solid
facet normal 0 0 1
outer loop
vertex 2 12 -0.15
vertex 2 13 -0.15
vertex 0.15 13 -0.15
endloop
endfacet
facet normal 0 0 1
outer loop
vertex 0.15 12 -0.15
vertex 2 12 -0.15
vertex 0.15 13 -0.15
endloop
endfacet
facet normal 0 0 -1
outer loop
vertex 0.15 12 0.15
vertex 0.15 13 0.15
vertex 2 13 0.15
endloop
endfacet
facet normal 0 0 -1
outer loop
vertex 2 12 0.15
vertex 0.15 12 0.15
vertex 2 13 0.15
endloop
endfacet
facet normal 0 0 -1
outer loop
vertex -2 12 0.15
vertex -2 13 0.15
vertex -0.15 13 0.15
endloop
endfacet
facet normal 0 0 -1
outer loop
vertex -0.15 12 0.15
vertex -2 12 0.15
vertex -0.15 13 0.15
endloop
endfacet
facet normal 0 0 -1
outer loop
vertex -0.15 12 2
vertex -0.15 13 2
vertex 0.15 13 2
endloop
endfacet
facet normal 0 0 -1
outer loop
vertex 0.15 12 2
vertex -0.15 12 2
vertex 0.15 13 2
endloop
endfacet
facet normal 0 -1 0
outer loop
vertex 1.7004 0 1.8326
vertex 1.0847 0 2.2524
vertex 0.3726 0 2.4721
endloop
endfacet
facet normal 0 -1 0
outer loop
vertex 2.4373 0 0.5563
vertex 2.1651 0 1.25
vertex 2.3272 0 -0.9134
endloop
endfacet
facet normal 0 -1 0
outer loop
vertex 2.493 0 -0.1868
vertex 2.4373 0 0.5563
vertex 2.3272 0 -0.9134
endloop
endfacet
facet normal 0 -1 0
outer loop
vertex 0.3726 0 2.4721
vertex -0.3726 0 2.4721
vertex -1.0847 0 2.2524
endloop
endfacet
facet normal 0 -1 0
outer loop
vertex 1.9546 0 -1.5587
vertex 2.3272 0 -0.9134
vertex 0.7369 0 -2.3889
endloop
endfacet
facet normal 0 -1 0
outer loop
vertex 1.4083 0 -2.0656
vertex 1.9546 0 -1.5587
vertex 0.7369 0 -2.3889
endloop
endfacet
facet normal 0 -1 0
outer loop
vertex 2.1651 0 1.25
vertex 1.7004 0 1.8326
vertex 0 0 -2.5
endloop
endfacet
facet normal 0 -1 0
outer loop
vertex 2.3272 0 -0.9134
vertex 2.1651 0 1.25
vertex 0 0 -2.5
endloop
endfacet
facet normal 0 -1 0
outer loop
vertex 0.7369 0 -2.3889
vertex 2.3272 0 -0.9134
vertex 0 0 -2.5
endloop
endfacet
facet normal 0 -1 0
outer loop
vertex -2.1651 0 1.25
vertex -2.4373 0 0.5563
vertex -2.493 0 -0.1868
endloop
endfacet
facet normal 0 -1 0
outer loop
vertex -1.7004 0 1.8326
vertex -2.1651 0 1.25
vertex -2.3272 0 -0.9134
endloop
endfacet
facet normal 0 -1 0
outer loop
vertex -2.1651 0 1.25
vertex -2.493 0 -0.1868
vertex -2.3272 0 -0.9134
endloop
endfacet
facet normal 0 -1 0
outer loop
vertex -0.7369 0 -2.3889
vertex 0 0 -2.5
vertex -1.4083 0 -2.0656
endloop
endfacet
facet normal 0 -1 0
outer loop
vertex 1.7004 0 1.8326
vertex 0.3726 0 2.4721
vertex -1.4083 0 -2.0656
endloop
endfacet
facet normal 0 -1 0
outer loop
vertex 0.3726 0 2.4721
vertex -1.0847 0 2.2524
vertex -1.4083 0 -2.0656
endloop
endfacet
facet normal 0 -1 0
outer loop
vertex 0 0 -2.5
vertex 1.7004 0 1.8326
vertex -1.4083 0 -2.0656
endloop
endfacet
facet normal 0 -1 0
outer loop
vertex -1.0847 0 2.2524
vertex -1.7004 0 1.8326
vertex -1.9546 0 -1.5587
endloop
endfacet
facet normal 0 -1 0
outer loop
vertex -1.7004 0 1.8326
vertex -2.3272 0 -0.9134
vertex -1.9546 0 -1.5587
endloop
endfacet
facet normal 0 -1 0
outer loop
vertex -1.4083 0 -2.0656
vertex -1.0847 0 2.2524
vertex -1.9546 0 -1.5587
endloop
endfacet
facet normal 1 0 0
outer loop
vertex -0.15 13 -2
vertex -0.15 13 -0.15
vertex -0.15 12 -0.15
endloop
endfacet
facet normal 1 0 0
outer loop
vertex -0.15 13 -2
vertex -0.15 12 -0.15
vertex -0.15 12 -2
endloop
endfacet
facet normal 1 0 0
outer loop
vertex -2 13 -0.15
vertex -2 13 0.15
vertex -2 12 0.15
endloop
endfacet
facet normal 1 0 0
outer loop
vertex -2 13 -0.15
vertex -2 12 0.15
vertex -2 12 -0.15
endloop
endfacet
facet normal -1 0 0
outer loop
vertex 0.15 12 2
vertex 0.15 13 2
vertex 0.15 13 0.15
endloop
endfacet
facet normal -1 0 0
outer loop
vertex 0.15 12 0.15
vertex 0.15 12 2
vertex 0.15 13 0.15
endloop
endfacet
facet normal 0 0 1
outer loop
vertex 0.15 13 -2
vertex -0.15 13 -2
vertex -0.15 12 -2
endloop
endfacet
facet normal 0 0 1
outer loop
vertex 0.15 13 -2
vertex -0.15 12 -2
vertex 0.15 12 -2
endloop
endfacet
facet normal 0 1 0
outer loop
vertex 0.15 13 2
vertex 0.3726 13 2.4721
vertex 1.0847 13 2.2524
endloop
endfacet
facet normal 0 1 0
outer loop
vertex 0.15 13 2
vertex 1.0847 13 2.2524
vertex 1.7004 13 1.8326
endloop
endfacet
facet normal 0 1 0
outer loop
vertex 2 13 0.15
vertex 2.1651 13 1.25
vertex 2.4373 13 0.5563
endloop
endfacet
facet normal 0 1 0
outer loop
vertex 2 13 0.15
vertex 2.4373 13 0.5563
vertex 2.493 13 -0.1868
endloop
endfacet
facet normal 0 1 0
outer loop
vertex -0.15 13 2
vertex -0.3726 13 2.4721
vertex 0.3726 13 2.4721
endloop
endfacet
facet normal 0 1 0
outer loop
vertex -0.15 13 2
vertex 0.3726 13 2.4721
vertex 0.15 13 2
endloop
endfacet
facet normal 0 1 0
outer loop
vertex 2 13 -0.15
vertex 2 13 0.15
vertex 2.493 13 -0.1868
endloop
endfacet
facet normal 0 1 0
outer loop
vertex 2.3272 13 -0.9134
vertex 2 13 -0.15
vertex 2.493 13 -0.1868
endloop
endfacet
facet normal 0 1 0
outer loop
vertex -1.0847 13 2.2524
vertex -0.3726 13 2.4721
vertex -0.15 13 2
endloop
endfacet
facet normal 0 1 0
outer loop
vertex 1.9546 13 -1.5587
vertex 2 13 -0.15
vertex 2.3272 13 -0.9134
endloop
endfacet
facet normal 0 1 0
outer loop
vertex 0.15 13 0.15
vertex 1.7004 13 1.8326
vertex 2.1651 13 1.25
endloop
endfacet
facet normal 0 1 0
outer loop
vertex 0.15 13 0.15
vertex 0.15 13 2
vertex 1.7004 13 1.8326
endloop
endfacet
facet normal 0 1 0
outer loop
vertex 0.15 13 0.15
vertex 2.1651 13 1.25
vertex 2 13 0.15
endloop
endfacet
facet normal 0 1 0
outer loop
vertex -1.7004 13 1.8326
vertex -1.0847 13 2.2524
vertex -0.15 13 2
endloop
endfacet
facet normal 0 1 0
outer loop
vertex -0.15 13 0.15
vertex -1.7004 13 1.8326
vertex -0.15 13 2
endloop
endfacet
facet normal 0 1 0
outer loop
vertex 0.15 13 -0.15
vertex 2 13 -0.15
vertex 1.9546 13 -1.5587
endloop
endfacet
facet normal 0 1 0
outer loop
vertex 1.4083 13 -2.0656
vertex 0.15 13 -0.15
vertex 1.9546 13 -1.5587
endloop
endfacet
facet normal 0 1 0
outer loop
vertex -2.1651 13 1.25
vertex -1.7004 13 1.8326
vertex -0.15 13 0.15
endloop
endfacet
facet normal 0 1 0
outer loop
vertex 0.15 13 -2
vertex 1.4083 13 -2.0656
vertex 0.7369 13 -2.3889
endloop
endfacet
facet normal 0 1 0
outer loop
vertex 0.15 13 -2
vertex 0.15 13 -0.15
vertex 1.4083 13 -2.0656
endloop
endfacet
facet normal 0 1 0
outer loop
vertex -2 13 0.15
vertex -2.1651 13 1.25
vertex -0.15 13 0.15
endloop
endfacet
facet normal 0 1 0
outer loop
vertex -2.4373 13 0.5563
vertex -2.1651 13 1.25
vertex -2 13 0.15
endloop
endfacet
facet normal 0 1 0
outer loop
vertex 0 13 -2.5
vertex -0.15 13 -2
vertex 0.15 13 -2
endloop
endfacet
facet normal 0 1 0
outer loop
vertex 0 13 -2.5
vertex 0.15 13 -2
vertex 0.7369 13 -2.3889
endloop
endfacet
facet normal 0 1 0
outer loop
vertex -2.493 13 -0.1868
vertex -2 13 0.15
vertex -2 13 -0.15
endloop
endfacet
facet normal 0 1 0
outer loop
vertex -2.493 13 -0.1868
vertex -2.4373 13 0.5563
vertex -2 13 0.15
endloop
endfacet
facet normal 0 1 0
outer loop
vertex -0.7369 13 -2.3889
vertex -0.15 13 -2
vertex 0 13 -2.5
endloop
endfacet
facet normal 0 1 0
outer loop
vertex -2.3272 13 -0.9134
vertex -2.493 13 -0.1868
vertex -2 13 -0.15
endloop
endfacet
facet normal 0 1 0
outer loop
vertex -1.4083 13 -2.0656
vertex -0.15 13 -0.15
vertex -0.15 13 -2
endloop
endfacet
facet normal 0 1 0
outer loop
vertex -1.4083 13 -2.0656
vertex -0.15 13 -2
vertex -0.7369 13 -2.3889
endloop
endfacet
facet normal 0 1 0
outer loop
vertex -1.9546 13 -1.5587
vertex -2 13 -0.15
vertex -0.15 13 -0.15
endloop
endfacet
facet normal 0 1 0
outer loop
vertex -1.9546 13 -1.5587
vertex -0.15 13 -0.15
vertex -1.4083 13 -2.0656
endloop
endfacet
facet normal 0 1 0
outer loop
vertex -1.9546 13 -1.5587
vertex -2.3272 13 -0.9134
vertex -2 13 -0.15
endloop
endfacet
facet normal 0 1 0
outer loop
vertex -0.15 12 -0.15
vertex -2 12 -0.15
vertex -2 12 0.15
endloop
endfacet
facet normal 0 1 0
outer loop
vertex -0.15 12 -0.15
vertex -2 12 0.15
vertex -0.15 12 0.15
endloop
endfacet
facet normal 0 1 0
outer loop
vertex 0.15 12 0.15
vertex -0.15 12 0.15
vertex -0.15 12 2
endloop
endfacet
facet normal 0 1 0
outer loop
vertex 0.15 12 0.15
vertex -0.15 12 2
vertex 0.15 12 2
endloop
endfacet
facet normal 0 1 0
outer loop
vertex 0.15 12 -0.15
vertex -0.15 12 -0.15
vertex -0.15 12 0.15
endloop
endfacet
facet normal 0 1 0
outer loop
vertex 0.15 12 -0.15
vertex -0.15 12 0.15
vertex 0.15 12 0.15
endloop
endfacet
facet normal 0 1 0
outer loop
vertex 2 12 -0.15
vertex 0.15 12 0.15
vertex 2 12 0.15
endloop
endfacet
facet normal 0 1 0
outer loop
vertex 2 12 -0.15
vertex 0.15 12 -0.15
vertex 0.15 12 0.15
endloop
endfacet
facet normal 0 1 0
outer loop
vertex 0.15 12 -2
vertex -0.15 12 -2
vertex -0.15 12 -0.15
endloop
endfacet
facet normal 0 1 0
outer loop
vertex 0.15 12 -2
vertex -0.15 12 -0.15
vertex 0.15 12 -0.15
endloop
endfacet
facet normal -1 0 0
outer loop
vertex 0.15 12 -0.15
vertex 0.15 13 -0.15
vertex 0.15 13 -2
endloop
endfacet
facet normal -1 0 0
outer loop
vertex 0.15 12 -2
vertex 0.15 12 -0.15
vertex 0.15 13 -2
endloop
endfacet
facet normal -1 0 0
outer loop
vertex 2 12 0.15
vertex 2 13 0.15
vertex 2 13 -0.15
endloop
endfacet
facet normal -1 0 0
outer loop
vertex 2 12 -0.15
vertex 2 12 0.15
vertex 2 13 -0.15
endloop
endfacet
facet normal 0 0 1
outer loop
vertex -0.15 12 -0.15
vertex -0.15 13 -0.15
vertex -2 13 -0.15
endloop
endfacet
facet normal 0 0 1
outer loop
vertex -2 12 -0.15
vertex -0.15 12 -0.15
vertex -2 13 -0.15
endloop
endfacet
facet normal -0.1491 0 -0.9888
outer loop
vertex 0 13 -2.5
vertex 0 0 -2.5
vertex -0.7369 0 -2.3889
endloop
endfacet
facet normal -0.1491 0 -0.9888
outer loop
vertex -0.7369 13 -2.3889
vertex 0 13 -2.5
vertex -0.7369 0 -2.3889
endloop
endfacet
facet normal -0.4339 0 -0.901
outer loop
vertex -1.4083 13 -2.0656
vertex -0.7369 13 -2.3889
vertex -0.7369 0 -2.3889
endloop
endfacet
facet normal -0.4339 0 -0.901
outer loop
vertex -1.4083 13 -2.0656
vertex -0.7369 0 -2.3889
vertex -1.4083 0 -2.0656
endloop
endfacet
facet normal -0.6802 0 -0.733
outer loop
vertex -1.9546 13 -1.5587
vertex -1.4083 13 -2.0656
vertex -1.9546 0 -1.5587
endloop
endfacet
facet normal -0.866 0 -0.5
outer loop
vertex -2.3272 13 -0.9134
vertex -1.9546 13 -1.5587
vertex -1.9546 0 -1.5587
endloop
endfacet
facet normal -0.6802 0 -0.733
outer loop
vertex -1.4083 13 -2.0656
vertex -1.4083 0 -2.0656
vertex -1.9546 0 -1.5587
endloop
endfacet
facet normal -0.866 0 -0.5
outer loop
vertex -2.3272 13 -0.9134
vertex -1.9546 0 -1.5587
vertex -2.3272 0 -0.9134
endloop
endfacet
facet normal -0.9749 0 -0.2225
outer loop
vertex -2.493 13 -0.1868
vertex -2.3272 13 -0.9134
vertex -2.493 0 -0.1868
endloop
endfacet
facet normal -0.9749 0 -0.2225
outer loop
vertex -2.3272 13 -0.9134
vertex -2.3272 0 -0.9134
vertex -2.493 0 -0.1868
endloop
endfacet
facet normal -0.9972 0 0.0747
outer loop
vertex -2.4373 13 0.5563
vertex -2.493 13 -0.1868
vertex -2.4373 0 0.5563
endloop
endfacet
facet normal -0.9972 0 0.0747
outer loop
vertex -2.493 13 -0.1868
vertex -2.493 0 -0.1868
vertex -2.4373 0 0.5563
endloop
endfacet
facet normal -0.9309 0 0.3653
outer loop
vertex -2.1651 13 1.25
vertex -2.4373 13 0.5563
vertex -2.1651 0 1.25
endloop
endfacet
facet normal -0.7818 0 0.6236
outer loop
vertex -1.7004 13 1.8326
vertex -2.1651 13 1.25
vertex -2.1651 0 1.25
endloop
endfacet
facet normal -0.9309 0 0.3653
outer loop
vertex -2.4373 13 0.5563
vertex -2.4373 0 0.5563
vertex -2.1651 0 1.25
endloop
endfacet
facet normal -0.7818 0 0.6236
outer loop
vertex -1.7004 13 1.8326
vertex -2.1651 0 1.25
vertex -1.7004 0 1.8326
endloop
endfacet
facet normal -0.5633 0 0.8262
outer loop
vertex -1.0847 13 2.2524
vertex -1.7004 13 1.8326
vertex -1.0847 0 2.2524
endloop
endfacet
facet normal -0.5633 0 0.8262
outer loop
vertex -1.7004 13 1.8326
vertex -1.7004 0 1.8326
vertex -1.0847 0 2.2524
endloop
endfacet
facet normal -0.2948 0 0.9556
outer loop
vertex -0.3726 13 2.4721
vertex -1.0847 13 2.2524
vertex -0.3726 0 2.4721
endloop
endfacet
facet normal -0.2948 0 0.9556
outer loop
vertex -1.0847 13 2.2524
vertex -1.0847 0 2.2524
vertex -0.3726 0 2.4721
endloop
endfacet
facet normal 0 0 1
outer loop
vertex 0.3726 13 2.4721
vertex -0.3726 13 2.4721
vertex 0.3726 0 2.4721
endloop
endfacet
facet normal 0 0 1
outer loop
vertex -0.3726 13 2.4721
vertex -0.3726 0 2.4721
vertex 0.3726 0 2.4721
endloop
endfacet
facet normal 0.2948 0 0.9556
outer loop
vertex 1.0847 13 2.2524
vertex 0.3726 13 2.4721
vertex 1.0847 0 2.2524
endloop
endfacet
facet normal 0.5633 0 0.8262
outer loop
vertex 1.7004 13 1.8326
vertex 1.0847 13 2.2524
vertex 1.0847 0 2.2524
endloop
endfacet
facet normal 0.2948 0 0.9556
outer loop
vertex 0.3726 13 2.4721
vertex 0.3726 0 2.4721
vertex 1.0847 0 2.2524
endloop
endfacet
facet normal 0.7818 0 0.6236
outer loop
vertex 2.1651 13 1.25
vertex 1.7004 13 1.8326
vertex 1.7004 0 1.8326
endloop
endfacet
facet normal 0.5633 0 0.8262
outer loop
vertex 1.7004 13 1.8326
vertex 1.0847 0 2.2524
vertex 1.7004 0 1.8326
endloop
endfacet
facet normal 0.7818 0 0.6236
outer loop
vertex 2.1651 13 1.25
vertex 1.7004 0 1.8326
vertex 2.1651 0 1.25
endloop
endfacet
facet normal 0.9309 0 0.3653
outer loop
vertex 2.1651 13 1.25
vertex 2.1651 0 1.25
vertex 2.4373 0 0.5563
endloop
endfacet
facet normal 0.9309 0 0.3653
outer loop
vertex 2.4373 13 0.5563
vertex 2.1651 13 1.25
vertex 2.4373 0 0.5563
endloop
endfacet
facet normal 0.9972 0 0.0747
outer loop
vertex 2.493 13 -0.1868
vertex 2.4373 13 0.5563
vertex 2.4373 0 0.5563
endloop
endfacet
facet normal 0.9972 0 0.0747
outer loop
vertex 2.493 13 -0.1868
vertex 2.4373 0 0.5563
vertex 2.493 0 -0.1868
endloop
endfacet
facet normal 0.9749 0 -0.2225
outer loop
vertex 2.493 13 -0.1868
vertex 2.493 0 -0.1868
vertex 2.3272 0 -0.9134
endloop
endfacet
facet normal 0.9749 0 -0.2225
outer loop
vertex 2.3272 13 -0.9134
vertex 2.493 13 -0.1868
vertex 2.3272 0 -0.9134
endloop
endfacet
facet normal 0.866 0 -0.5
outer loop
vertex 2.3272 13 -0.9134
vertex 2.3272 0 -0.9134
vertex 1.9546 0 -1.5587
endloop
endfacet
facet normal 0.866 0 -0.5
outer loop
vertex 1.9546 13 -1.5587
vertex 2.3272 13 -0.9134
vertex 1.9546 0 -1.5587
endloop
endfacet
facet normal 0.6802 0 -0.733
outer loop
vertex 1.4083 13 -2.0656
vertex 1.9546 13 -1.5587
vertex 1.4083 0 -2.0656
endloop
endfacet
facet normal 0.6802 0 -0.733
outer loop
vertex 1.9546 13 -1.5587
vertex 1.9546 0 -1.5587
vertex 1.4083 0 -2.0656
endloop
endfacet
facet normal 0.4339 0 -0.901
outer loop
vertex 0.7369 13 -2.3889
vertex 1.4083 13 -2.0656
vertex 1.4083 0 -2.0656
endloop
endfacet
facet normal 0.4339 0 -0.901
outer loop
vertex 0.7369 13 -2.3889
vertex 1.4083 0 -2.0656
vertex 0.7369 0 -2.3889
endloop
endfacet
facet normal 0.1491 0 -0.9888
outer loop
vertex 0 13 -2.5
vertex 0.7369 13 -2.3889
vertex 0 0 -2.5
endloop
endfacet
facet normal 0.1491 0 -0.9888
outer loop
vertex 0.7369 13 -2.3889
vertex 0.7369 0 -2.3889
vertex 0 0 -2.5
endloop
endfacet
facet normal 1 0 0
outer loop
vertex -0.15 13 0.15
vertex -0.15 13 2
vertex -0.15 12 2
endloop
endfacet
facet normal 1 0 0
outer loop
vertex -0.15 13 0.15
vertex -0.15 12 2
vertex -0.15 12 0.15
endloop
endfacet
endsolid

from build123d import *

# Parameters (mm, degrees)
SKETCH2_R           = 2.5
BOSS_EXTRUDE1_DEPTH = 13
SKETCH3_W           = 1.85
SKETCH3_H           = 0.3
SKETCH3_W_2         = 0.3
SKETCH3_H_2         = 1.85
CUT_EXTRUDE1_DEPTH  = 1


with BuildPart() as part:
    # Sketch2 → Boss-Extrude1 (new body)
    with BuildSketch(Plane(origin=(0, 0, 0), x_dir=(1, 0, 0), z_dir=(0, 1, 0))):
        with Locations(Location((0, 0, 0), (0, 0, 90))):
            Circle(SKETCH2_R)
    extrude(amount=BOSS_EXTRUDE1_DEPTH)

    # Sketch3 → Cut-Extrude1 (cut)
    with BuildSketch(Plane(origin=(0, 13, 0), x_dir=(1, 0, 0), z_dir=(0, 1, 0))):
        with Locations((1.075, 0)):
            Rectangle(SKETCH3_W, SKETCH3_H)
        Rectangle(SKETCH3_W_2, SKETCH3_H)
        with Locations((-1.075, 0)):
            Rectangle(SKETCH3_W, SKETCH3_H)
        with Locations((0, 1.075)):
            Rectangle(SKETCH3_W_2, SKETCH3_H_2)
        with Locations((0, -1.075)):
            Rectangle(SKETCH3_W_2, SKETCH3_H_2)
    extrude(amount=-CUT_EXTRUDE1_DEPTH, mode=Mode.SUBTRACT)


solid = part.part
